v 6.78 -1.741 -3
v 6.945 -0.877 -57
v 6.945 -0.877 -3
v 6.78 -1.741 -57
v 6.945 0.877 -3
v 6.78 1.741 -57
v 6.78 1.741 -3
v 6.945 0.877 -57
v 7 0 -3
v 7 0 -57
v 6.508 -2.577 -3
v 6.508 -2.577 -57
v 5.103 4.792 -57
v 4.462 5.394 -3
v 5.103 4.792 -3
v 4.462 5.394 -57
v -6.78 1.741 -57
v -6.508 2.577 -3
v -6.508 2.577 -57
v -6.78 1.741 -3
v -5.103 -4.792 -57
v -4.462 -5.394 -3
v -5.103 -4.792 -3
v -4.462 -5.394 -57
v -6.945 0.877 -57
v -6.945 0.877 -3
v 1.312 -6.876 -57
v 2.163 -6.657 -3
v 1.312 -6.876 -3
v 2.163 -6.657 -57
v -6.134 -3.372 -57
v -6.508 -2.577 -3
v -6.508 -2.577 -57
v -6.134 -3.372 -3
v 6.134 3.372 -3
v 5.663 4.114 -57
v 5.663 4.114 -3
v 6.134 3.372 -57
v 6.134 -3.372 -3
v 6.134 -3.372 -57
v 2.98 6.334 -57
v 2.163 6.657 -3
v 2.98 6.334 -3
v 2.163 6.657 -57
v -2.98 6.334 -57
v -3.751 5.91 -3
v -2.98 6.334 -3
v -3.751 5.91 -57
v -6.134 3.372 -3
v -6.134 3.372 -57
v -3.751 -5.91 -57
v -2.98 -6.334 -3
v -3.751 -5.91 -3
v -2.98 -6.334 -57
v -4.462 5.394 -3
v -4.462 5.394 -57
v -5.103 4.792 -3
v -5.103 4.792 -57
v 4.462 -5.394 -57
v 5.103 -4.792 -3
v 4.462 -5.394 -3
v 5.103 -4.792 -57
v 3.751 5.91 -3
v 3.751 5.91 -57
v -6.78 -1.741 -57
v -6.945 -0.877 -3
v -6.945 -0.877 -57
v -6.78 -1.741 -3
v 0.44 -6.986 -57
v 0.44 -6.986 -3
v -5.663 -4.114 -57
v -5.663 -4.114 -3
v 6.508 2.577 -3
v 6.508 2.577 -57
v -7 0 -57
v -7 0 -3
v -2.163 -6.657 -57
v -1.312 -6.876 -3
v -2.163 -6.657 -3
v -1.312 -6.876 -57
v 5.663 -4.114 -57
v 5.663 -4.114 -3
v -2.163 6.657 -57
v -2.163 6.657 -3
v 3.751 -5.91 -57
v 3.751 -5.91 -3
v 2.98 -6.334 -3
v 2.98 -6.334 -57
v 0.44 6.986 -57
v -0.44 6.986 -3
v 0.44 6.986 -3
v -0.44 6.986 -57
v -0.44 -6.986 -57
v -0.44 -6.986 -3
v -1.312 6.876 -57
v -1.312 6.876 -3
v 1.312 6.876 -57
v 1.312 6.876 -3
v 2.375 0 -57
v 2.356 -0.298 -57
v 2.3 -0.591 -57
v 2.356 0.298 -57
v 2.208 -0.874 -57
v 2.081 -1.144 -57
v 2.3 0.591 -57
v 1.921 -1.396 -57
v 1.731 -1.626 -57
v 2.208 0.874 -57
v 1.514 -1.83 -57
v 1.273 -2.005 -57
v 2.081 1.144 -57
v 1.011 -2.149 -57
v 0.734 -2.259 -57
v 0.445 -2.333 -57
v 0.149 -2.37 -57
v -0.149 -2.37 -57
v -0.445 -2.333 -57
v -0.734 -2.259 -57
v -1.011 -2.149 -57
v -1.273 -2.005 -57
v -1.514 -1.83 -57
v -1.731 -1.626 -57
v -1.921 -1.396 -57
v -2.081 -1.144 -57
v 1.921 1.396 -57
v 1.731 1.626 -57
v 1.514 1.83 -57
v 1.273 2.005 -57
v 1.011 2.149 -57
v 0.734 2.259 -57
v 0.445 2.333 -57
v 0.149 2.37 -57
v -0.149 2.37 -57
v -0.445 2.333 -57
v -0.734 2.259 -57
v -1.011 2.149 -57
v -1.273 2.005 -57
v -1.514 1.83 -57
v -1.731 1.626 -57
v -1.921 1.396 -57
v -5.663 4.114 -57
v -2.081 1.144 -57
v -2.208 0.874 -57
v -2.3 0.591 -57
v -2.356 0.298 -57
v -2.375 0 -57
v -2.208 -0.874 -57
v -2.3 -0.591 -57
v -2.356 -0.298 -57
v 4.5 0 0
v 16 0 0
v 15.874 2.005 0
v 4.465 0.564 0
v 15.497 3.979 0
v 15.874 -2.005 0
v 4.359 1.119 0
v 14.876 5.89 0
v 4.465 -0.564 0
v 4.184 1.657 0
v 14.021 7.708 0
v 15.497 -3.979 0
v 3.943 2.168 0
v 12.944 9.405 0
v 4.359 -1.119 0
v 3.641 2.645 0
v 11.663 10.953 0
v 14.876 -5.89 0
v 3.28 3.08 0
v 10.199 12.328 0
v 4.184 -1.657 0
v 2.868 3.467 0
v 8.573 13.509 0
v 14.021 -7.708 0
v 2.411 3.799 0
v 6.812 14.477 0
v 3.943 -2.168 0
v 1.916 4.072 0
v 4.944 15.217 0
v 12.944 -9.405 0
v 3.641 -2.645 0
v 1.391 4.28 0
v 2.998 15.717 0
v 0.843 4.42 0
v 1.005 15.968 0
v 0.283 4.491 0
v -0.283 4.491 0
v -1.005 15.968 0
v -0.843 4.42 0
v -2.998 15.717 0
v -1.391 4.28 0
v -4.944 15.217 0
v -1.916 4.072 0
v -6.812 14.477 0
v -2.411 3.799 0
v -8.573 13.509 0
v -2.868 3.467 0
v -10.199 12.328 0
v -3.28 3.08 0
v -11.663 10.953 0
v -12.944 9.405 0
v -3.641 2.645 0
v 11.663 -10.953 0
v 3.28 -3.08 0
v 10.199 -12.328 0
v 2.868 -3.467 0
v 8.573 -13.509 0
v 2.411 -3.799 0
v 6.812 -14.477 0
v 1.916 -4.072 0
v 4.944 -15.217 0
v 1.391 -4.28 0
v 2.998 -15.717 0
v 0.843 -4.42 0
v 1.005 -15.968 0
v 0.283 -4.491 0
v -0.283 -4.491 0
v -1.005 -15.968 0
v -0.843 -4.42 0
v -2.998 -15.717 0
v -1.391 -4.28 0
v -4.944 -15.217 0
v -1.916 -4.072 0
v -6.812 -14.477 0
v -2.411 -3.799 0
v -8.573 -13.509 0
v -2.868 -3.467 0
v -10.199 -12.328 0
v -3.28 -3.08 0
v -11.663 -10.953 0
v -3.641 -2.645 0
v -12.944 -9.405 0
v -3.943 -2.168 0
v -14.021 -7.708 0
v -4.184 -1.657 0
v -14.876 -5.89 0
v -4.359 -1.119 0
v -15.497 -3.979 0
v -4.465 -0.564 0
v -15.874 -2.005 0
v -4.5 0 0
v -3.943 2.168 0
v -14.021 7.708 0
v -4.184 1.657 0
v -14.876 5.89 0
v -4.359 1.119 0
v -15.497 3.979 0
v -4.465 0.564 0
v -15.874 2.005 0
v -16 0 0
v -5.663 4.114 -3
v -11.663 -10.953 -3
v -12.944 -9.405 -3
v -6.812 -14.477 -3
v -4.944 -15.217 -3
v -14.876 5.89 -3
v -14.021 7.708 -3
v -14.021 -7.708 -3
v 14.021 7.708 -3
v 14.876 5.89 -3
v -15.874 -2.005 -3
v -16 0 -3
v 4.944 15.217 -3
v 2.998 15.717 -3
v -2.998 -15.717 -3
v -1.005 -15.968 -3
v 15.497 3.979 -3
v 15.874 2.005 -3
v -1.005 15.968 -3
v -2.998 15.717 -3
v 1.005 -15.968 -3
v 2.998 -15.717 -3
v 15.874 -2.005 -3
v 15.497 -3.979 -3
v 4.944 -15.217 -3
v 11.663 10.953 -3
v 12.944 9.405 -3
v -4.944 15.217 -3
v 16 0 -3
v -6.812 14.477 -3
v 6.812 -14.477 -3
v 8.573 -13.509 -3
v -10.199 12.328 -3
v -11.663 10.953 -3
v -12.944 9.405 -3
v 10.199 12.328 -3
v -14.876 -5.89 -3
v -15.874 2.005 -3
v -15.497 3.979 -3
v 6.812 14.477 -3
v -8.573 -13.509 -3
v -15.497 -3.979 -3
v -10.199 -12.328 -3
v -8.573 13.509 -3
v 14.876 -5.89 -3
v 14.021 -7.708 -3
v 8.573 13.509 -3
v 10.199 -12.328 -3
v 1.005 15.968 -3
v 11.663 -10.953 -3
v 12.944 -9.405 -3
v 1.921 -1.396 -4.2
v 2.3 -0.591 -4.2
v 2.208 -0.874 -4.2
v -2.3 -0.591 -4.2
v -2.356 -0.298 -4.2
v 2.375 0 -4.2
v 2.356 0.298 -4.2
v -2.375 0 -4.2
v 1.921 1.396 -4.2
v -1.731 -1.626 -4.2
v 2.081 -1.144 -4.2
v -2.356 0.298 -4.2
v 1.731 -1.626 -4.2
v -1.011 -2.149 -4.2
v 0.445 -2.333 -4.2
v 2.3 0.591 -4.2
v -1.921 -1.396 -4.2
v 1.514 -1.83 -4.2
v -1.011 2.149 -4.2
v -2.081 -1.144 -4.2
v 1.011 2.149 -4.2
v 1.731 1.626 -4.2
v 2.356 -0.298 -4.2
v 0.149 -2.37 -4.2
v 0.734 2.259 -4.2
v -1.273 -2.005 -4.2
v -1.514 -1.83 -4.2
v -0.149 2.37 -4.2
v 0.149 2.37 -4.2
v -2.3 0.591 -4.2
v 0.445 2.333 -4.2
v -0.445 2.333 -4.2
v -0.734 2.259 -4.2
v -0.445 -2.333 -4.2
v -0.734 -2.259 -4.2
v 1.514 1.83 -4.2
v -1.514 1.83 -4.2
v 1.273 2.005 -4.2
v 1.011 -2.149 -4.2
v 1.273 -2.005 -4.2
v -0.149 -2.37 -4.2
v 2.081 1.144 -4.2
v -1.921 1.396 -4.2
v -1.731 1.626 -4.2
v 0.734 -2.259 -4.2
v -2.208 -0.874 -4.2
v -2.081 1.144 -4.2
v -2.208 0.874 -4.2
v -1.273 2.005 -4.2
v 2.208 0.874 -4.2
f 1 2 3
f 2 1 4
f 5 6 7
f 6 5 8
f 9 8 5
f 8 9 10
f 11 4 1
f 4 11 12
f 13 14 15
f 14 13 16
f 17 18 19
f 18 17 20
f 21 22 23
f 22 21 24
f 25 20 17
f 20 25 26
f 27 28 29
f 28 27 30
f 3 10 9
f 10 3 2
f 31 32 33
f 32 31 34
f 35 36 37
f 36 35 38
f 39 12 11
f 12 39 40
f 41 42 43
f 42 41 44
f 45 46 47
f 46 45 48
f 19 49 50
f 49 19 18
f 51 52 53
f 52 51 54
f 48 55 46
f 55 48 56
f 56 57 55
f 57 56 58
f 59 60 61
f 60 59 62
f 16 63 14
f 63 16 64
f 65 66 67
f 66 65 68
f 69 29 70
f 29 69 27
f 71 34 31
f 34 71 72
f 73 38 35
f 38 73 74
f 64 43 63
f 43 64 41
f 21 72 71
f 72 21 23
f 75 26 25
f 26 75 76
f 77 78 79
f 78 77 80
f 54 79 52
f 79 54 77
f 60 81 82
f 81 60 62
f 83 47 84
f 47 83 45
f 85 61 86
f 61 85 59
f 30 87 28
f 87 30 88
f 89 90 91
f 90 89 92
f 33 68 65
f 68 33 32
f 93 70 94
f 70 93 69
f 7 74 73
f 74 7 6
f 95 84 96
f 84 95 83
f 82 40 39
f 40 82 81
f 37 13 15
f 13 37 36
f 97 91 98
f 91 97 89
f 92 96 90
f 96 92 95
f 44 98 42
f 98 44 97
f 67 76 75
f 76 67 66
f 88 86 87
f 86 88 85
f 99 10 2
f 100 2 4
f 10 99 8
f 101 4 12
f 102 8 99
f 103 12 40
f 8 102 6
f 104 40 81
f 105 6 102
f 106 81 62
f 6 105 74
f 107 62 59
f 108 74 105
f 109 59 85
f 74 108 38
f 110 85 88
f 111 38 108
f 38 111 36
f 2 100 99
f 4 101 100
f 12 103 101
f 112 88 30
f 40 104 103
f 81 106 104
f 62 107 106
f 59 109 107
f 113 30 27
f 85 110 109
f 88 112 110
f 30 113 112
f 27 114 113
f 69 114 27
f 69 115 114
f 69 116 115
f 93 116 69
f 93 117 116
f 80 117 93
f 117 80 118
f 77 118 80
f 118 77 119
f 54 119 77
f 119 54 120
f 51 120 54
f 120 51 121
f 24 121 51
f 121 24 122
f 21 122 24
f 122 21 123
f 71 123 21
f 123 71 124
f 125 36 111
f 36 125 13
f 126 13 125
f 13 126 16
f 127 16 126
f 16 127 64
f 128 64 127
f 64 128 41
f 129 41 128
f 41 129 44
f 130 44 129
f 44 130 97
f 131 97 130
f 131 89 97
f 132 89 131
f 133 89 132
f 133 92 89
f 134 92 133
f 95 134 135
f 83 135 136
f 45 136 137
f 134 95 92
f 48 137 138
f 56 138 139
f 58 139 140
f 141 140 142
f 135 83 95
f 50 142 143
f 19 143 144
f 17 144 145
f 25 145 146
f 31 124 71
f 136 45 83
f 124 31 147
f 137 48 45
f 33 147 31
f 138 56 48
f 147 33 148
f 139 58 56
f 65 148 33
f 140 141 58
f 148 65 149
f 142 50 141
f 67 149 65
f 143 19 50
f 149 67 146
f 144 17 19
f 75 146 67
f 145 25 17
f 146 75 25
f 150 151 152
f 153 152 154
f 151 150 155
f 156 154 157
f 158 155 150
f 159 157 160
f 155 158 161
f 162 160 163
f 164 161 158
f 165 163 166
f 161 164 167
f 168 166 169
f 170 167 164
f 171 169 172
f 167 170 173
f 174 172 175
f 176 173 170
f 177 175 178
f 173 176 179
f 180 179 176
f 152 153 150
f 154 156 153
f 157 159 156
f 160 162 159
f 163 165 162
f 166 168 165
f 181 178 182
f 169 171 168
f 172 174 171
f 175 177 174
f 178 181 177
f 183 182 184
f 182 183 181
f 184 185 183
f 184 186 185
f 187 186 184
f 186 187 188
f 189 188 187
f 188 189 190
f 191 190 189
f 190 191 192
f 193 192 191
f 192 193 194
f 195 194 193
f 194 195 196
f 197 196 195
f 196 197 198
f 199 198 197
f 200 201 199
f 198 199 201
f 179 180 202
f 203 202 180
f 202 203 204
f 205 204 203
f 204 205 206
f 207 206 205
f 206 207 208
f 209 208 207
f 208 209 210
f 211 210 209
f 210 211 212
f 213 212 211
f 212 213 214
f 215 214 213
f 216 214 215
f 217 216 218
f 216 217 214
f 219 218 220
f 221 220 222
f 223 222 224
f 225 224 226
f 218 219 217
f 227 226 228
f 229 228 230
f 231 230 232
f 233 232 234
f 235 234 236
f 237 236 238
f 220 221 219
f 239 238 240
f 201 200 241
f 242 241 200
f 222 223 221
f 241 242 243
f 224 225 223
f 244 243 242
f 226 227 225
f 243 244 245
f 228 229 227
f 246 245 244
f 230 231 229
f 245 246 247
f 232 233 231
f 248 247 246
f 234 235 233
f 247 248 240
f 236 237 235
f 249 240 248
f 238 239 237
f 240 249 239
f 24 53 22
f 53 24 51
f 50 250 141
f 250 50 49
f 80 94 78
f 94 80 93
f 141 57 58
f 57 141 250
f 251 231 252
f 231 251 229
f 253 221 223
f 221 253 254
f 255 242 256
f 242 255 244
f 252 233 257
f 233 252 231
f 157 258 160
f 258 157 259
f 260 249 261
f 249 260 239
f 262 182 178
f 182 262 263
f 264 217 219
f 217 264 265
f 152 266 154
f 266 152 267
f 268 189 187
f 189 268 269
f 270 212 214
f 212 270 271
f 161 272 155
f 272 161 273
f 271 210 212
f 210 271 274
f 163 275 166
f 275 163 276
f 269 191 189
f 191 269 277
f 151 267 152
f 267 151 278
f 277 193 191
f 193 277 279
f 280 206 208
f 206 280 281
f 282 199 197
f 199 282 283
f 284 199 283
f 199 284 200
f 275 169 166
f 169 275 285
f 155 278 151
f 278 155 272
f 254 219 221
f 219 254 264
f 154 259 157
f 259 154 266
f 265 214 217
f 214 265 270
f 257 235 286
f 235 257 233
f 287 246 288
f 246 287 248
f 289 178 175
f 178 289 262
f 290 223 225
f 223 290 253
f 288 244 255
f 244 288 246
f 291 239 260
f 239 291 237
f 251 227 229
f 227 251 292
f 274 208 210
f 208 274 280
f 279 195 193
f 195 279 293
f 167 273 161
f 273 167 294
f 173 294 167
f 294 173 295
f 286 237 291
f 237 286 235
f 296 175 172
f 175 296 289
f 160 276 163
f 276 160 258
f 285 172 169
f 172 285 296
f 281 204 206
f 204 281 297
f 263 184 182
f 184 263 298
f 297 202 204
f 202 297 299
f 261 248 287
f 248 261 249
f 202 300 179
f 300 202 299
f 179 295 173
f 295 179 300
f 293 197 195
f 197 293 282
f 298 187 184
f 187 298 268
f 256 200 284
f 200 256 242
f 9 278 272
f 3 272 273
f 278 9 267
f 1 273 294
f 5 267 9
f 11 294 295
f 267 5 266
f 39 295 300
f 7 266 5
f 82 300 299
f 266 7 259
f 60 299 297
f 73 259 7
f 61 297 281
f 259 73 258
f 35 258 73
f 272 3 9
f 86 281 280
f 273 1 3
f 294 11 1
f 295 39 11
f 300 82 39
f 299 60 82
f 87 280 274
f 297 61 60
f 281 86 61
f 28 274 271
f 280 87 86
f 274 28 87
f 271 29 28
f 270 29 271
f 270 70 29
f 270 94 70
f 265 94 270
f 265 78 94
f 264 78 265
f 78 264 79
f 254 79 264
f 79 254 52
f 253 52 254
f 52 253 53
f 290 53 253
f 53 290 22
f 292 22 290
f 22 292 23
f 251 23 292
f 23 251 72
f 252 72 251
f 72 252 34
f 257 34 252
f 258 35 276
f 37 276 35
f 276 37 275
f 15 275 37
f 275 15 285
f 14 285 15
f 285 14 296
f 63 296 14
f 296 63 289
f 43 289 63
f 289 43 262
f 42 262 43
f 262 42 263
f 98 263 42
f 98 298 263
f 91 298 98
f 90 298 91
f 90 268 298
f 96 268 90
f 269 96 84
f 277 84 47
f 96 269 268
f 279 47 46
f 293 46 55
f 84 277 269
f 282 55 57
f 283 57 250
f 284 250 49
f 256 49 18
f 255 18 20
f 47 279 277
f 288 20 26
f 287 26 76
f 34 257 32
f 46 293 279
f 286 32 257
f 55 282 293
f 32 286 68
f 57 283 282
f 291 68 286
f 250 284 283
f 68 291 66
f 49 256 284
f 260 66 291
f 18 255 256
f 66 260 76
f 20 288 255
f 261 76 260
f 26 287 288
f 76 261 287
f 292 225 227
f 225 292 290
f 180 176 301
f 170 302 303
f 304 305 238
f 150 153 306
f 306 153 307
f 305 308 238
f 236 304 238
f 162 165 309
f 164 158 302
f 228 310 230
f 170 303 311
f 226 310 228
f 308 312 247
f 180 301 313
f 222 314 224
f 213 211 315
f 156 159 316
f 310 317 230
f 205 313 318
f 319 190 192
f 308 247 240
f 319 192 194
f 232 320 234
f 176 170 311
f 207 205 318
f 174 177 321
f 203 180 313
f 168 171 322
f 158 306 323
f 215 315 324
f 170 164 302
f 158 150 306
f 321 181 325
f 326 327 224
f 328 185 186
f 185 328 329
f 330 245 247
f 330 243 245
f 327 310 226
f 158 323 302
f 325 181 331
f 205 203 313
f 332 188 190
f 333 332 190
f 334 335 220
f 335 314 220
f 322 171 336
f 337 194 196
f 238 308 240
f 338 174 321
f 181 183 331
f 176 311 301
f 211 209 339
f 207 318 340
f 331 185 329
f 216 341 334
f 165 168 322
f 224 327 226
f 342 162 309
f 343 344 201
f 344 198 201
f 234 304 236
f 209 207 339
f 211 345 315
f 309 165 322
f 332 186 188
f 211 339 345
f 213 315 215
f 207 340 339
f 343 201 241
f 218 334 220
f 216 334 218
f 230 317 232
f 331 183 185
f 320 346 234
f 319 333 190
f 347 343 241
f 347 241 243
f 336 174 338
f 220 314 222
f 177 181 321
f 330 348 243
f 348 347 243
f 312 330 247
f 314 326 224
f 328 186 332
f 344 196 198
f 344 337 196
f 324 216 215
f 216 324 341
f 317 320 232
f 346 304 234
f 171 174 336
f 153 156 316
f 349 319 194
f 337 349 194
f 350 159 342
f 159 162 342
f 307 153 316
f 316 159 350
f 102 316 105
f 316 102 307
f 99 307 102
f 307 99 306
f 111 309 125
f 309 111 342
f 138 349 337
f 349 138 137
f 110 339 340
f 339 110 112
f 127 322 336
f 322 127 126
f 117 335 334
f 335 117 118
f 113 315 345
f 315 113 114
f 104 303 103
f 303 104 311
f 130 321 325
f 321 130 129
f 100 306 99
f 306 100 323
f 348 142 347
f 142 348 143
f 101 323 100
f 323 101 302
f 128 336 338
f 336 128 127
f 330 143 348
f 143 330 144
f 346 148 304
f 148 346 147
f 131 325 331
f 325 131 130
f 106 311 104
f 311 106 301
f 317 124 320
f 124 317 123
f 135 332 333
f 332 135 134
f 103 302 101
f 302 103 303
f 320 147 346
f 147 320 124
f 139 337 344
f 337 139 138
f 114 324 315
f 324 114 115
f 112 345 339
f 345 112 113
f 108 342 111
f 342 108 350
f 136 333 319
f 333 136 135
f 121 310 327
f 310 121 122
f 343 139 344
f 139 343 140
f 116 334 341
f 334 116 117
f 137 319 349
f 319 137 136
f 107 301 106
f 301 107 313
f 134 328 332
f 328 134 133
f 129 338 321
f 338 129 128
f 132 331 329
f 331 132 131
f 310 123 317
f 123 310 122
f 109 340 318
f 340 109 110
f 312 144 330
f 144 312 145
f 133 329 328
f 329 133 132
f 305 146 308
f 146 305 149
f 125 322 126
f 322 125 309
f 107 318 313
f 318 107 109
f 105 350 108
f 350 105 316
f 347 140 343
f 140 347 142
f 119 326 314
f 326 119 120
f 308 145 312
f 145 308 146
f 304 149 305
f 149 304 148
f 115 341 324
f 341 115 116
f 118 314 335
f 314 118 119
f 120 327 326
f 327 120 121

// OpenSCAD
$fn = 50;


difference() {
	union() {
		translate(v = [0, 0, -57.0000000000]) {
			cylinder(h = 57, r = 7.0000000000);
		}
		translate(v = [0, 0, -3.0000000000]) {
			cylinder(h = 3, r = 16.0000000000);
		}
	}
	union() {
		translate(v = [0, 0, 0]) {
			rotate(a = [0, 0, 0]) {
				difference() {
					union() {
						#translate(v = [0, 0, -57.0000000000]) {
							cylinder(h = 57, r = 2.2500000000);
						}
						#translate(v = [0, 0, -4.2000000000]) {
							cylinder(h = 4.2000000000, r1 = 2.3750000000, r2 = 4.5000000000);
						}
						#translate(v = [0, 0, -57.0000000000]) {
							cylinder(h = 57, r = 2.3750000000);
						}
						#translate(v = [0, 0, -57.0000000000]) {
							cylinder(h = 57, r = 2.2500000000);
						}
					}
					union();
				}
			}
		}
	}
}
